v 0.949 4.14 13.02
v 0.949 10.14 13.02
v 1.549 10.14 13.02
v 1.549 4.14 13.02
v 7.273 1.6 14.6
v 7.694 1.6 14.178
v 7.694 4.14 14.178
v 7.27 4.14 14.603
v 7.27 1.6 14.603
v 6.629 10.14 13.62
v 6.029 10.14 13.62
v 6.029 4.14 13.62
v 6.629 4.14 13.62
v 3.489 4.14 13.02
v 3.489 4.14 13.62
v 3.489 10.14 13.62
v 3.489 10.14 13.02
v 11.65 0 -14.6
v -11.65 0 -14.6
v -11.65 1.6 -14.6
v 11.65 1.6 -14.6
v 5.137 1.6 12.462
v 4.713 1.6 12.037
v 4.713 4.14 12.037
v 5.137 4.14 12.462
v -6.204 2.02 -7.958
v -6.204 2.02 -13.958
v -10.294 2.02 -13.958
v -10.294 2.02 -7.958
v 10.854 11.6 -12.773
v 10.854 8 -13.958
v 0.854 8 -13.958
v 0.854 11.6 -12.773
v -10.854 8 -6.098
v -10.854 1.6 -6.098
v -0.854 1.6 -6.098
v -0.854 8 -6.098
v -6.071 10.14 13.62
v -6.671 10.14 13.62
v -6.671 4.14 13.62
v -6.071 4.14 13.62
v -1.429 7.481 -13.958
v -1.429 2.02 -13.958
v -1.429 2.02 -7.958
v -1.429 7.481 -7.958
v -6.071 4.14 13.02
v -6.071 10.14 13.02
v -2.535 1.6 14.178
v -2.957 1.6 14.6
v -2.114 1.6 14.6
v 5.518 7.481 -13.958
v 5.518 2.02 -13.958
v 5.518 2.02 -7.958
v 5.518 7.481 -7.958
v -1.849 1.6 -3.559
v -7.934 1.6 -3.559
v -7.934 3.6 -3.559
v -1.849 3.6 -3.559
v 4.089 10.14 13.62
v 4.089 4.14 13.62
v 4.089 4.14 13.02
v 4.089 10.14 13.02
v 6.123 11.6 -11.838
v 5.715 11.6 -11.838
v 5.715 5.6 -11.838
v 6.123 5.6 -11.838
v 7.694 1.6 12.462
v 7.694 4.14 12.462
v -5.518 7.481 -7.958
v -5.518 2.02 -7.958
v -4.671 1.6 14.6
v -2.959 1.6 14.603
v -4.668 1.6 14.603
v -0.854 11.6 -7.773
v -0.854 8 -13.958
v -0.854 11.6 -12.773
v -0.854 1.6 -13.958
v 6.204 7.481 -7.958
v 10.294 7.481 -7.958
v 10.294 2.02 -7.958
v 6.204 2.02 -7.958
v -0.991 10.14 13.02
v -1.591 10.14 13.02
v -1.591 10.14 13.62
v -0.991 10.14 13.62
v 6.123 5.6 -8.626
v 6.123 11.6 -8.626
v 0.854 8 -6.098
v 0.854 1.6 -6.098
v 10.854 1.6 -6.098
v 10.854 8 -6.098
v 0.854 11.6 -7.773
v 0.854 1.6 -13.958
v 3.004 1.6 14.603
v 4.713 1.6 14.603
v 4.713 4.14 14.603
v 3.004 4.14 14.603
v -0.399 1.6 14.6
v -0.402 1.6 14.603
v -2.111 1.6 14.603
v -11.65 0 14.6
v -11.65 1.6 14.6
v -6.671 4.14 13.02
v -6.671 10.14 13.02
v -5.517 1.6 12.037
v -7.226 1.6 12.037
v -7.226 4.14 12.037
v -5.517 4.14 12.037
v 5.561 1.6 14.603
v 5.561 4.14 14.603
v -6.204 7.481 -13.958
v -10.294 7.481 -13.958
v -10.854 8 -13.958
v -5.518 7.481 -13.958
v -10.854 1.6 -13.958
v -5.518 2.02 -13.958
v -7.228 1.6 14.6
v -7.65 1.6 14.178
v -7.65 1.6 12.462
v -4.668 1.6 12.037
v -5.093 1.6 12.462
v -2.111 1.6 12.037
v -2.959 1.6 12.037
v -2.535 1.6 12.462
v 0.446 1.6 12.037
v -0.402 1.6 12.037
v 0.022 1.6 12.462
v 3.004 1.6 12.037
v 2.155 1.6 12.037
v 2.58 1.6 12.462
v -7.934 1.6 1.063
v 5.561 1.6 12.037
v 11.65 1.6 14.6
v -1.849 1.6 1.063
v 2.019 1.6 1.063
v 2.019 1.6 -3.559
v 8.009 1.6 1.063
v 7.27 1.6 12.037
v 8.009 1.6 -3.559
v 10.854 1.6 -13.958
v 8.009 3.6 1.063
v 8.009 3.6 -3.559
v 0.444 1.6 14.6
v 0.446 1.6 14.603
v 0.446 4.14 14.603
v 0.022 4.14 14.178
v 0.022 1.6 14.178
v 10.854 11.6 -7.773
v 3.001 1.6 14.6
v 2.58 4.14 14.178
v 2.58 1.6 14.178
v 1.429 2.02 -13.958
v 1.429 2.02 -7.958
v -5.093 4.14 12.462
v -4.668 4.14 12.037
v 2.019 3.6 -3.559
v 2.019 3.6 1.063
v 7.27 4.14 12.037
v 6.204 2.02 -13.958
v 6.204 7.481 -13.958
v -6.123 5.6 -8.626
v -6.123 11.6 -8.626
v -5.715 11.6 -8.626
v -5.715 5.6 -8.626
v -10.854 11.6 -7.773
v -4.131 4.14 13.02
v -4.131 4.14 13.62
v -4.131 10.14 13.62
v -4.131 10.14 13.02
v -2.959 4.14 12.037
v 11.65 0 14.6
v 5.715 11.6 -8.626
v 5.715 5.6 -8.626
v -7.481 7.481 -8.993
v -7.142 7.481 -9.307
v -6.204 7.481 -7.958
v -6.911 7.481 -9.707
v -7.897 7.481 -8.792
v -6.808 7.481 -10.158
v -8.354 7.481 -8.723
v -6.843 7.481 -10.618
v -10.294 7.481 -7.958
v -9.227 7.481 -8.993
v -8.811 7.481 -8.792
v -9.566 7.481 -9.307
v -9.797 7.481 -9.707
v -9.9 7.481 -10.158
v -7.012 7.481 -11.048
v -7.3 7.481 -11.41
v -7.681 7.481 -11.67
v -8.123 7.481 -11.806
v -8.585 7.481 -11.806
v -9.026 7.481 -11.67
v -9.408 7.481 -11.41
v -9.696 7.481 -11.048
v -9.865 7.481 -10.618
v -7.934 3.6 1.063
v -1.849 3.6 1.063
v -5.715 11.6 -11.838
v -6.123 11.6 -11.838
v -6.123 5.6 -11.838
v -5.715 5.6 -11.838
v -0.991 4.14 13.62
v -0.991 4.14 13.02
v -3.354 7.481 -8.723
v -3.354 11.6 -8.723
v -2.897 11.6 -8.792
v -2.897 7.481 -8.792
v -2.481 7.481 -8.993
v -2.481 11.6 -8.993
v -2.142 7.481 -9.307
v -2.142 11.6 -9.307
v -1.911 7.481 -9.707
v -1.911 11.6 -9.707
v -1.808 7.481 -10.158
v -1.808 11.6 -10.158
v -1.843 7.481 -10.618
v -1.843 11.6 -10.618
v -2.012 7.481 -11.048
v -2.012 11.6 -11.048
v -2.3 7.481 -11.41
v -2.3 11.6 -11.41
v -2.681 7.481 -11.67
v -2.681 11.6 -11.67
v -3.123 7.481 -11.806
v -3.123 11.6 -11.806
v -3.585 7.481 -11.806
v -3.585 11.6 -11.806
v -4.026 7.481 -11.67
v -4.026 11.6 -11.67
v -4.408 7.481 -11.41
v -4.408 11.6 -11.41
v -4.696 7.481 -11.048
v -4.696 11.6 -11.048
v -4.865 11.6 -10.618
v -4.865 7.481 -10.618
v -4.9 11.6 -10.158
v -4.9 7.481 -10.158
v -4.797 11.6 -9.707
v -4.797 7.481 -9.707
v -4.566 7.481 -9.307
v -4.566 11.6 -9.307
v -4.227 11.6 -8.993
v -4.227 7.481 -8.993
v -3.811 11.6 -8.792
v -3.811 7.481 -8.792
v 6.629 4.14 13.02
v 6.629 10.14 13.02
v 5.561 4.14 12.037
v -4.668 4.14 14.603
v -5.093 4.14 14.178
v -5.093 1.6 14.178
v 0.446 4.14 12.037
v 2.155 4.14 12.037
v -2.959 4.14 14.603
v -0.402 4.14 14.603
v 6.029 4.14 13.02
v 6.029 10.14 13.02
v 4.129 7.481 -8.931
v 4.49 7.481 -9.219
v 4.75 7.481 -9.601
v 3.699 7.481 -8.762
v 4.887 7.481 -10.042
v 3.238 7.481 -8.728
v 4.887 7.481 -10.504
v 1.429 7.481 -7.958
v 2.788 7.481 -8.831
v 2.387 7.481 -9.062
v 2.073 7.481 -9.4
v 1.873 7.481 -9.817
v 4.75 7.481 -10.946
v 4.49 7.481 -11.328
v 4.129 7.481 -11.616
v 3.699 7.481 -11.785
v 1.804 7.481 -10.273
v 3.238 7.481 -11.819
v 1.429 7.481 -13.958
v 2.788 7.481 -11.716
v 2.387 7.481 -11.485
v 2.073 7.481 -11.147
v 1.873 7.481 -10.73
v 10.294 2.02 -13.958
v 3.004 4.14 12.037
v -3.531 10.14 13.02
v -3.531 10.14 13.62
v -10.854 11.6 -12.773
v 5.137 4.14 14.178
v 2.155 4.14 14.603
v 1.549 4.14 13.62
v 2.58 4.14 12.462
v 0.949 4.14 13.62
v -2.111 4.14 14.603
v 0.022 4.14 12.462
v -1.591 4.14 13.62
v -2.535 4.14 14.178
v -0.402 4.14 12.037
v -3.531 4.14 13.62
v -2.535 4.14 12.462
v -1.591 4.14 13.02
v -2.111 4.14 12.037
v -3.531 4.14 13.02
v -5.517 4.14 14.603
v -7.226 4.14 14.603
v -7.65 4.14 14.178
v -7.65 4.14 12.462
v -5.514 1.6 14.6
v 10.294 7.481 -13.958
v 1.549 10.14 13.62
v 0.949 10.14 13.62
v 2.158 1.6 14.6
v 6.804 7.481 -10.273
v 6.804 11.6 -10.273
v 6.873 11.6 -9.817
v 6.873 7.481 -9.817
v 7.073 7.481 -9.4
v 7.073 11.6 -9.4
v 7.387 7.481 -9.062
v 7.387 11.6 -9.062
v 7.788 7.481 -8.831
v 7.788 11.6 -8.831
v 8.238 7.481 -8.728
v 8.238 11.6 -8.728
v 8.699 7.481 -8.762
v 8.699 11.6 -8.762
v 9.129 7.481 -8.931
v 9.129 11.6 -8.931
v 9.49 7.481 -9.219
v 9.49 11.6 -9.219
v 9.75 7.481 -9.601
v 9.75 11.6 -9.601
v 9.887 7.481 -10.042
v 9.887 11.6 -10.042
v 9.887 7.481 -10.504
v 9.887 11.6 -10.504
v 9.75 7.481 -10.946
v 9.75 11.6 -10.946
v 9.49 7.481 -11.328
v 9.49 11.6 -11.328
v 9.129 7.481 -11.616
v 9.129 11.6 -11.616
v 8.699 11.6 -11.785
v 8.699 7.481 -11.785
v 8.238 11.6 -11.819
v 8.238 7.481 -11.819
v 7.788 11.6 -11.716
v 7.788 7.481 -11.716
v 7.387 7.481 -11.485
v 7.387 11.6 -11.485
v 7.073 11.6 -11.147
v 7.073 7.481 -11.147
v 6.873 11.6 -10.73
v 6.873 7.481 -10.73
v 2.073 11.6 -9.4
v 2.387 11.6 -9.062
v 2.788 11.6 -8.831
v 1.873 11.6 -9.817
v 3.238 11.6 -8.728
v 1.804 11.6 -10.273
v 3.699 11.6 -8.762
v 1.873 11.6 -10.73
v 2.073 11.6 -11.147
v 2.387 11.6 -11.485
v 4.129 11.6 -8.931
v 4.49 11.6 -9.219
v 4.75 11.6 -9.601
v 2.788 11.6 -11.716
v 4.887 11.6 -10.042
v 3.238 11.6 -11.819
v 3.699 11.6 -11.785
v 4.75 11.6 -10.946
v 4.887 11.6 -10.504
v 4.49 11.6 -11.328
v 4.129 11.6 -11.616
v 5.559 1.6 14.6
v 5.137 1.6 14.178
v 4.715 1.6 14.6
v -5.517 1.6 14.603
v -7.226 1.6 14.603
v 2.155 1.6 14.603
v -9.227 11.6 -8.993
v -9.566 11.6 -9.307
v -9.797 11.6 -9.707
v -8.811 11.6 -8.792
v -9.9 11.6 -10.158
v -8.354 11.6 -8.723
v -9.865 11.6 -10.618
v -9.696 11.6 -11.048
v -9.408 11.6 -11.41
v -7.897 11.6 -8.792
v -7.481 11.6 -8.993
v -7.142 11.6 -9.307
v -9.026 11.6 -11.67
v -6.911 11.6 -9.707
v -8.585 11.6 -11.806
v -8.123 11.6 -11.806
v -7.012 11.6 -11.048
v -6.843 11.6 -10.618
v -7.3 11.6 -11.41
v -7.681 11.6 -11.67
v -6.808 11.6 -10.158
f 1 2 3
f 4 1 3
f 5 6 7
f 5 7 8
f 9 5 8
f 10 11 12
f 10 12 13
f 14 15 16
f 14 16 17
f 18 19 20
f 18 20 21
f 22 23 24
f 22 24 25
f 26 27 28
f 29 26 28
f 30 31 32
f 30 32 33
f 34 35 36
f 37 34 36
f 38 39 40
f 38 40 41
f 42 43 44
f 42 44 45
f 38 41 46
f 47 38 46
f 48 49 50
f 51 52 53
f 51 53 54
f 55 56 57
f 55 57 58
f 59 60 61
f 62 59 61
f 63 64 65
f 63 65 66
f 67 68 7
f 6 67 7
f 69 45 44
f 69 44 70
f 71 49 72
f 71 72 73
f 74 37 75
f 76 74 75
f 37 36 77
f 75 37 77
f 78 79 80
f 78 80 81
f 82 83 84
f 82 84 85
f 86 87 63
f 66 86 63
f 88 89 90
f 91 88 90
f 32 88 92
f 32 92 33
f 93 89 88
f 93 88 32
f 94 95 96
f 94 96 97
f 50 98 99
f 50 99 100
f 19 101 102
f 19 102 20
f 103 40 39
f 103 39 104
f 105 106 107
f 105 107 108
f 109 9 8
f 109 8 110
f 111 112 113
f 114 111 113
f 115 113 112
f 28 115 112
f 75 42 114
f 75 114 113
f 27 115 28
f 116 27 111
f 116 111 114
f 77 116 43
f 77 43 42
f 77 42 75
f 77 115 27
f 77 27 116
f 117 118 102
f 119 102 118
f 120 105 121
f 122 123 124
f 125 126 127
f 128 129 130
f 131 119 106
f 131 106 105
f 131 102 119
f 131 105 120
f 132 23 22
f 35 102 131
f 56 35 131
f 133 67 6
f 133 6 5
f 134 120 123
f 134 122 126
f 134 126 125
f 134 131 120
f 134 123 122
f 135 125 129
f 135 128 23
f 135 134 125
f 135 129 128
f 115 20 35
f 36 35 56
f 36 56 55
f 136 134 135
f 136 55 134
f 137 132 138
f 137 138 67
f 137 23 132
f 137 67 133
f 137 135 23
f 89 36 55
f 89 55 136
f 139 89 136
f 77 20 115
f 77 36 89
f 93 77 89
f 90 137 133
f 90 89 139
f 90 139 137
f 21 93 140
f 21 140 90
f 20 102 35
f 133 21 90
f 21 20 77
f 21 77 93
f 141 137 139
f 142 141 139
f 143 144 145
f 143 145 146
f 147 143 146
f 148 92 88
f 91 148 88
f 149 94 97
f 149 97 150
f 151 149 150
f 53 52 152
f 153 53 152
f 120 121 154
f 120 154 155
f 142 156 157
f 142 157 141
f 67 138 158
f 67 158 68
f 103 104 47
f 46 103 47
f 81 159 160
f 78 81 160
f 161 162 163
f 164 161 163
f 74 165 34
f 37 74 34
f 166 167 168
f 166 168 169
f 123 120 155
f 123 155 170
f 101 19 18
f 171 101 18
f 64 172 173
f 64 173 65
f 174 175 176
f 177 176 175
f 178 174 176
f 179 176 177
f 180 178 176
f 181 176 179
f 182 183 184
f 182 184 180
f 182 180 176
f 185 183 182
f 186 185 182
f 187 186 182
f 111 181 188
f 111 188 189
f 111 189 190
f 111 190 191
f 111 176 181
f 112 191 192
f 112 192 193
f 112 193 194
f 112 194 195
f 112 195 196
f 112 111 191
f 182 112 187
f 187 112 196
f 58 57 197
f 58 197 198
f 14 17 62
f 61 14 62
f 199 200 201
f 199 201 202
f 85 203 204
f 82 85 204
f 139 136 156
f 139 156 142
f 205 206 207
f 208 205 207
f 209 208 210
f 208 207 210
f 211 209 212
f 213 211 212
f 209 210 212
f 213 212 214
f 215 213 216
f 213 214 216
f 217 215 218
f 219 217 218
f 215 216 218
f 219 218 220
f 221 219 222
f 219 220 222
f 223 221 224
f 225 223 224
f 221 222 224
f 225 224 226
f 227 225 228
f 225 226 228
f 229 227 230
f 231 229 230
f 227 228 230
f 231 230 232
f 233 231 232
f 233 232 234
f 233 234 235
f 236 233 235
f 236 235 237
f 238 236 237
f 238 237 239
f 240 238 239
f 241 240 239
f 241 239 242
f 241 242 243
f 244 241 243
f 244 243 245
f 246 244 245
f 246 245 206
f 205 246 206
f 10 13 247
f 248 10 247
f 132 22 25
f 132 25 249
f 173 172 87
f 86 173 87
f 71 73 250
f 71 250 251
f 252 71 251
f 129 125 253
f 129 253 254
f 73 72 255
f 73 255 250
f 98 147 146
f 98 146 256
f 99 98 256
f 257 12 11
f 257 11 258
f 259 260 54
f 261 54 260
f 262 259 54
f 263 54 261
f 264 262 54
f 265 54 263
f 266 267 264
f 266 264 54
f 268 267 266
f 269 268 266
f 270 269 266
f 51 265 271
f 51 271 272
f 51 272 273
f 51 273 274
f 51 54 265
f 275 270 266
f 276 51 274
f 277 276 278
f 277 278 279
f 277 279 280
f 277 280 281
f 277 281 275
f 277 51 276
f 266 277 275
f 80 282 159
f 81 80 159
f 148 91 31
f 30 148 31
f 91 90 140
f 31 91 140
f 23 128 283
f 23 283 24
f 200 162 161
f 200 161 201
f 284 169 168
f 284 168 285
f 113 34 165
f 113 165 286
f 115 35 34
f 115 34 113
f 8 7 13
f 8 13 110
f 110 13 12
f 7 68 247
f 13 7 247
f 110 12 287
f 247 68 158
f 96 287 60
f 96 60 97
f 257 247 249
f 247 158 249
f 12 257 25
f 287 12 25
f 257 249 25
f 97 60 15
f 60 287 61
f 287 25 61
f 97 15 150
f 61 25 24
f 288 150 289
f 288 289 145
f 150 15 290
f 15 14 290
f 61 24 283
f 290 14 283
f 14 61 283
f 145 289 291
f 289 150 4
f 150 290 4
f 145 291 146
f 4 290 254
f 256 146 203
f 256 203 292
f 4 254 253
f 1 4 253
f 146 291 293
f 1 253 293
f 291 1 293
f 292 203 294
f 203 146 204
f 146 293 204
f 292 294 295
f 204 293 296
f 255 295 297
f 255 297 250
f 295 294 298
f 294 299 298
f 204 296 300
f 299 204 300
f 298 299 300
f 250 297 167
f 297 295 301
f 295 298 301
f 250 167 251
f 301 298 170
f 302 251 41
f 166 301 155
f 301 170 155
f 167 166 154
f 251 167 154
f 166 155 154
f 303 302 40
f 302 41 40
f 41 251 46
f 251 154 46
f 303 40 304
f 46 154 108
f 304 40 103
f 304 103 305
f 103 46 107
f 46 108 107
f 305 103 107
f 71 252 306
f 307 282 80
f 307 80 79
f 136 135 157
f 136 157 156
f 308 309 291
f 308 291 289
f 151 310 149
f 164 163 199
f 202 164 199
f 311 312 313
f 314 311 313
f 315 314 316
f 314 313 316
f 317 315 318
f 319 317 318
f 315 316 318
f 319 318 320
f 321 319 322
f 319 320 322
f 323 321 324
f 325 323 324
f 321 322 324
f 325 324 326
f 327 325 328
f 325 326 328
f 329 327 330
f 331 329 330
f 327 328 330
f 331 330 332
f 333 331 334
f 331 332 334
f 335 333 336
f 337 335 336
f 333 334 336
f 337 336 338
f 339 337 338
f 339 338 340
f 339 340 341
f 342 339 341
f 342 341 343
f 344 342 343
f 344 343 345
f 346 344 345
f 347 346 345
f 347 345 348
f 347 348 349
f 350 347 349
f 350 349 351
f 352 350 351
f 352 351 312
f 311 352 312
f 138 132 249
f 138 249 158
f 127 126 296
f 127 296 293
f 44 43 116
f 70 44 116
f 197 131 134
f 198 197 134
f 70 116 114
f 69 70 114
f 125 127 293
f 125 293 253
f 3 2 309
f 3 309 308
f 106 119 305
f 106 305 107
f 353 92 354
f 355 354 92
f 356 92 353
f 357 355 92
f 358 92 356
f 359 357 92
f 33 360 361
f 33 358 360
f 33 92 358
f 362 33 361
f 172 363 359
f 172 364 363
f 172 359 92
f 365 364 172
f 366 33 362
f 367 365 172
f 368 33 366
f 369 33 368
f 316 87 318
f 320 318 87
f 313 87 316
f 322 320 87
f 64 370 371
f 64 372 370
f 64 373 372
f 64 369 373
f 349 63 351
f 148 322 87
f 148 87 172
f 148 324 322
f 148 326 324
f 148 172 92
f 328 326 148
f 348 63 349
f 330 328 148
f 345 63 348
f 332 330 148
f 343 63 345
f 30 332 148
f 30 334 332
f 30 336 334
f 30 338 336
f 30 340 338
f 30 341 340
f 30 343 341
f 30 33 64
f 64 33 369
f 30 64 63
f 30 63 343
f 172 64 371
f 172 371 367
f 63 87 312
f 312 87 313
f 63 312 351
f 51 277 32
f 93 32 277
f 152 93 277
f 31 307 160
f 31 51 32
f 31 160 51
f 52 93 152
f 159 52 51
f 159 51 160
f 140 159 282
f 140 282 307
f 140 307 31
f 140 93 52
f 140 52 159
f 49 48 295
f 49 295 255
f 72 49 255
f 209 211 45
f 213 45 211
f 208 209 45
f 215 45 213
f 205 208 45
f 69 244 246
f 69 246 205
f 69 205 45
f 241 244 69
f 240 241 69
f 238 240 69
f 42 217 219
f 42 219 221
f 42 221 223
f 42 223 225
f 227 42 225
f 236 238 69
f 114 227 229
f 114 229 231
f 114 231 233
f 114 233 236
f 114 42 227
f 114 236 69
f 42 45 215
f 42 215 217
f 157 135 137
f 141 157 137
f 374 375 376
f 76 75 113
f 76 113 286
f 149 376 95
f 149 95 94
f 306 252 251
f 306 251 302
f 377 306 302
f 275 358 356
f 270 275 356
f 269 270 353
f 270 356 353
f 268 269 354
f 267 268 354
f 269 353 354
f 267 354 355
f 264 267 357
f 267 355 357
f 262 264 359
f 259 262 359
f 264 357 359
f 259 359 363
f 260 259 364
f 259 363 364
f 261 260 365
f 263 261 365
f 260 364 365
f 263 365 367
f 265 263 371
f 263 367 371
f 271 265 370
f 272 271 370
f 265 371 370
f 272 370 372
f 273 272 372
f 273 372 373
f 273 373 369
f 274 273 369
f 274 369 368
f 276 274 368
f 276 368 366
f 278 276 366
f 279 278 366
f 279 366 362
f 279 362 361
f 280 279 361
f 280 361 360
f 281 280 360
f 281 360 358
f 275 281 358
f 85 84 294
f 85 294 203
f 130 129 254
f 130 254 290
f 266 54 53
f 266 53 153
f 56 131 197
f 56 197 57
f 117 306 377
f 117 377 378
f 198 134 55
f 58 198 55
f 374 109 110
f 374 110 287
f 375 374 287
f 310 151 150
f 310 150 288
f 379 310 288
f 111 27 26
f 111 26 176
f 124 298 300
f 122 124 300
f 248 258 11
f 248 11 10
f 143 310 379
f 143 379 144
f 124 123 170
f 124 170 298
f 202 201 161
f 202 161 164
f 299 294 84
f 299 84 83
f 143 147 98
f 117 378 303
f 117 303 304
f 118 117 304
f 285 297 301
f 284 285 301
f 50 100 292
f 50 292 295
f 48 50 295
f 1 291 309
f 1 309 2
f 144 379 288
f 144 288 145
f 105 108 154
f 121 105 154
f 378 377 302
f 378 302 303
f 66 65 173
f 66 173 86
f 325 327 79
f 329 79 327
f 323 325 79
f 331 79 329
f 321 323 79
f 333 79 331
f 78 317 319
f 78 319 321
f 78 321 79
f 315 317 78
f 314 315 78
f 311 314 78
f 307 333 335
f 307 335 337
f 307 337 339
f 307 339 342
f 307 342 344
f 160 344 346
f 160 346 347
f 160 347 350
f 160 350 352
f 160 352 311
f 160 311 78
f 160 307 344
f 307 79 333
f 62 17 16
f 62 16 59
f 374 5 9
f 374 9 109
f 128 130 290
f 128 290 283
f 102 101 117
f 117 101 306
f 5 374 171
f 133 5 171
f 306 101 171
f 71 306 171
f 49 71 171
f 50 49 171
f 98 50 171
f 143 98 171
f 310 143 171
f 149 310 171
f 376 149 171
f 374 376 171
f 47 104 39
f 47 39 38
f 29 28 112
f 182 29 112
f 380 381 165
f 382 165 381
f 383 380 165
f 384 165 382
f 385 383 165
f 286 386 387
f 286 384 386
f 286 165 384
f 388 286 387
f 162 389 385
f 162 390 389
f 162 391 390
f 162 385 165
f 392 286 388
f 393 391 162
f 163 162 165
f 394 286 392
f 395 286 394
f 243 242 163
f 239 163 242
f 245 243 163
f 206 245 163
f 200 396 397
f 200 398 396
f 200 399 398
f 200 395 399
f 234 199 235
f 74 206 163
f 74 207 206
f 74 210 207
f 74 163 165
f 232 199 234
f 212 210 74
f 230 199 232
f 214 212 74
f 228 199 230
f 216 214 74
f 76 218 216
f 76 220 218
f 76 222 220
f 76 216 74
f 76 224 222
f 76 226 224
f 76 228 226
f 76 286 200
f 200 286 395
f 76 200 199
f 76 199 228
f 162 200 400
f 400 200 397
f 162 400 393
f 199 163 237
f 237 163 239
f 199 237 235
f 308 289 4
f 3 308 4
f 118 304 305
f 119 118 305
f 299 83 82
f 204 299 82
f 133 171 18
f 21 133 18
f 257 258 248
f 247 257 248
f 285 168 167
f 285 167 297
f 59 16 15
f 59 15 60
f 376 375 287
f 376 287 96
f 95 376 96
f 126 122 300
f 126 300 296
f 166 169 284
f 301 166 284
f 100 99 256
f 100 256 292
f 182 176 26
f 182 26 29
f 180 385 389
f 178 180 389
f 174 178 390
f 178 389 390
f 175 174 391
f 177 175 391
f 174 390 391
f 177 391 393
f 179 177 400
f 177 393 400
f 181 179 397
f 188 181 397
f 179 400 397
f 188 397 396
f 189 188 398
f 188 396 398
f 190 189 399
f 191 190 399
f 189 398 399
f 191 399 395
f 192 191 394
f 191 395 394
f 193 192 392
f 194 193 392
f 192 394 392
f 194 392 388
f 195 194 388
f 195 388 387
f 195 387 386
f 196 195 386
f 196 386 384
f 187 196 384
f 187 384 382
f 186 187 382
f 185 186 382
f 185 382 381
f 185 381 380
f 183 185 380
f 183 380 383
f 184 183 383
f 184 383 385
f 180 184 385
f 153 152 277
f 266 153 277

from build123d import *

# Parameters (mm, degrees)
SKETCH_1_W              = 23.3
SKETCH_1_H              = 29.2
EXTRUDE_1_DEPTH         = 1.6
EXTRUDE_2_DEPTH         = 2.54
SKETCH_3_W              = 0.6
SKETCH_3_H              = 0.6
EXTRUDE_3_DEPTH         = 6
PATTERN_LINEAR_11_COUNT = 6
PATTERN_LINEAR_11_PITCH = 2.54
SKETCH_4_W              = 6.084765078
SKETCH_4_H              = 4.622534711
SKETCH_4_W_2            = 5.990427635
EXTRUDE_4_DEPTH         = 2
SKETCH_5_W              = 10
SKETCH_5_H              = 7.86
EXTRUDE_5_DEPTH         = 10
CUT_EXTRUDE_1_DEPTH     = 28
SKETCH_7_W              = 4.089618495
SKETCH_7_H              = 5.460987571
CUT_EXTRUDE_2_DEPTH     = 6
SKETCH_8_R              = 1.55
SKETCH_8_W              = 0.408344746
SKETCH_8_H              = 3.212311997
CUT_EXTRUDE_3_DEPTH     = 6


with BuildPart() as part:
    # 草图1 → 凸台-拉伸1 (new body)
    with BuildSketch(Plane(origin=(0, 0, 0), x_dir=(1, 0, 0), z_dir=(0, 1, 0))):
        Rectangle(SKETCH_1_W, SKETCH_1_H)
    extrude(amount=EXTRUDE_1_DEPTH)

    # 草图2 → 凸台-拉伸2 (add)
    with BuildSketch(Plane(origin=(0, 1.6, 0), x_dir=(1, 0, 0), z_dir=(0, 1, 0))):
        Polygon((-4.668338696, -12.037397235), (-2.959469598, -12.037397235), (-2.535205529, -12.461661304), (-2.110941461, -12.037397235), (-0.402072363, -12.037397235), (0.022191706, -12.461661304), (0.446455775, -12.037397235), (2.155324873, -12.037397235), (2.579588942, -12.461661304), (3.00385301, -12.037397235), (4.712722108, -12.037397235), (5.136986177, -12.461661304), (5.561250246, -12.037397235), (7.270119344, -12.037397235), (7.694383412, -12.461661304), (7.694383412, -14.178338696), (7.270119344, -14.602602765), (5.561250246, -14.602602765), (5.136986177, -14.178338696), (4.712722108, -14.602602765), (3.00385301, -14.602602765), (2.579588942, -14.178338696), (2.155324873, -14.602602765), (0.446455775, -14.602602765), (0.022191706, -14.178338696), (-0.402072363, -14.602602765), (-2.110941461, -14.602602765), (-2.535205529, -14.178338696), (-2.959469598, -14.602602765), (-4.668338696, -14.602602765), (-5.092602765, -14.178338696), (-5.516866833, -14.602602765), (-7.225735931, -14.602602765), (-7.65, -14.178338696), (-7.65, -12.461661304), (-7.225735931, -12.037397235), (-5.516866833, -12.037397235), (-5.092602765, -12.461661304), align=None)
    extrude(amount=EXTRUDE_2_DEPTH)

    # 草图3 → 凸台-拉伸3 (add)
    with BuildSketch(Plane(origin=(0, 4.14, 0), x_dir=(1, 0, 0), z_dir=(0, 1, 0))):
        with Locations((-6.371301382, -13.32)):
            Rectangle(SKETCH_3_W, SKETCH_3_H)
    extrude_3 = extrude(amount=EXTRUDE_3_DEPTH)

    # 阵列(线性)11: 凸台-拉伸3 ×6
    with Locations(*[(i * PATTERN_LINEAR_11_PITCH, 0, 0) for i in range(1, PATTERN_LINEAR_11_COUNT)]):
        add(extrude_3)

    # 草图4 → 凸台-拉伸4 (add)
    with BuildSketch(Plane(origin=(0, 1.6, 0), x_dir=(1, 0, 0), z_dir=(0, 1, 0))):
        with Locations((-4.891303326, 1.247938362)):
            Rectangle(SKETCH_4_W, SKETCH_4_H)
        with Locations((5.014128197, 1.247938362)):
            Rectangle(SKETCH_4_W_2, SKETCH_4_H)
    extrude(amount=EXTRUDE_4_DEPTH)

    # 草图5 → 凸台-拉伸5 (add)
    with BuildSketch(Plane(origin=(0, 1.6, 0), x_dir=(1, 0, 0), z_dir=(0, 1, 0))):
        with Locations((-5.85390251, 10.028478066)):
            Rectangle(SKETCH_5_W, SKETCH_5_H)
        with Locations((5.85390251, 10.028478066)):
            Rectangle(SKETCH_5_W, SKETCH_5_H)
    extrude(amount=EXTRUDE_5_DEPTH)

    # 草图6 → 切除-拉伸1 (cut)
    with BuildSketch(Plane.ZY.offset(10.85390251)):
        Polygon((-13.958478066, 8), (-12.773407339, 11.6), (-7.773407339, 11.6), (-6.098478066, 8), (-4.60674586, 8), (-4.60674586, 12.734862091), (-15.29251654, 12.734862091), (-15.29251654, 8), align=None)
    extrude(amount=-CUT_EXTRUDE_1_DEPTH, mode=Mode.SUBTRACT)

    # 草图7 → 切除-拉伸2 (cut)
    with BuildSketch(Plane(origin=(0, 0, -13.958478066), x_dir=(-1, 0, 0), z_dir=(0, 0, -1))):
        with Locations((-8.248950011, 4.75004571)):
            Rectangle(SKETCH_7_W, SKETCH_7_H)
        with Locations((8.248950011, 4.75004571)):
            Rectangle(SKETCH_7_W, SKETCH_7_H)
        with Locations((3.473646978, 4.75004571)):
            Rectangle(SKETCH_7_W, SKETCH_7_H)
        with Locations((-3.473646978, 4.75004571)):
            Rectangle(SKETCH_7_W, SKETCH_7_H)
    extrude(amount=-CUT_EXTRUDE_2_DEPTH, mode=Mode.SUBTRACT)

    # 草图8 → 切除-拉伸3 (cut)
    with BuildSketch(Plane(origin=(0, 11.6, 0), x_dir=(1, 0, 0), z_dir=(0, 1, 0))):
        with Locations(Location((-8.35390251, 10.273407339, 0), (0, 0, 270))):
            Circle(SKETCH_8_R)
        with Locations(Location((-3.35390251, 10.273407339, 0), (0, 0, 270))):
            Circle(SKETCH_8_R)
        with Locations(Location((8.35390251, 10.273407339, 0), (0, 0, 180))):
            Circle(SKETCH_8_R)
        with Locations(Location((3.35390251, 10.273407339, 0), (0, 0, 180))):
            Circle(SKETCH_8_R)
        with Locations((-5.919084565, 10.231849543)):
            Rectangle(SKETCH_8_W, SKETCH_8_H)
        with Locations((5.919084565, 10.231849543)):
            Rectangle(SKETCH_8_W, SKETCH_8_H)
    extrude(amount=-CUT_EXTRUDE_3_DEPTH, mode=Mode.SUBTRACT)


solid = part.part
